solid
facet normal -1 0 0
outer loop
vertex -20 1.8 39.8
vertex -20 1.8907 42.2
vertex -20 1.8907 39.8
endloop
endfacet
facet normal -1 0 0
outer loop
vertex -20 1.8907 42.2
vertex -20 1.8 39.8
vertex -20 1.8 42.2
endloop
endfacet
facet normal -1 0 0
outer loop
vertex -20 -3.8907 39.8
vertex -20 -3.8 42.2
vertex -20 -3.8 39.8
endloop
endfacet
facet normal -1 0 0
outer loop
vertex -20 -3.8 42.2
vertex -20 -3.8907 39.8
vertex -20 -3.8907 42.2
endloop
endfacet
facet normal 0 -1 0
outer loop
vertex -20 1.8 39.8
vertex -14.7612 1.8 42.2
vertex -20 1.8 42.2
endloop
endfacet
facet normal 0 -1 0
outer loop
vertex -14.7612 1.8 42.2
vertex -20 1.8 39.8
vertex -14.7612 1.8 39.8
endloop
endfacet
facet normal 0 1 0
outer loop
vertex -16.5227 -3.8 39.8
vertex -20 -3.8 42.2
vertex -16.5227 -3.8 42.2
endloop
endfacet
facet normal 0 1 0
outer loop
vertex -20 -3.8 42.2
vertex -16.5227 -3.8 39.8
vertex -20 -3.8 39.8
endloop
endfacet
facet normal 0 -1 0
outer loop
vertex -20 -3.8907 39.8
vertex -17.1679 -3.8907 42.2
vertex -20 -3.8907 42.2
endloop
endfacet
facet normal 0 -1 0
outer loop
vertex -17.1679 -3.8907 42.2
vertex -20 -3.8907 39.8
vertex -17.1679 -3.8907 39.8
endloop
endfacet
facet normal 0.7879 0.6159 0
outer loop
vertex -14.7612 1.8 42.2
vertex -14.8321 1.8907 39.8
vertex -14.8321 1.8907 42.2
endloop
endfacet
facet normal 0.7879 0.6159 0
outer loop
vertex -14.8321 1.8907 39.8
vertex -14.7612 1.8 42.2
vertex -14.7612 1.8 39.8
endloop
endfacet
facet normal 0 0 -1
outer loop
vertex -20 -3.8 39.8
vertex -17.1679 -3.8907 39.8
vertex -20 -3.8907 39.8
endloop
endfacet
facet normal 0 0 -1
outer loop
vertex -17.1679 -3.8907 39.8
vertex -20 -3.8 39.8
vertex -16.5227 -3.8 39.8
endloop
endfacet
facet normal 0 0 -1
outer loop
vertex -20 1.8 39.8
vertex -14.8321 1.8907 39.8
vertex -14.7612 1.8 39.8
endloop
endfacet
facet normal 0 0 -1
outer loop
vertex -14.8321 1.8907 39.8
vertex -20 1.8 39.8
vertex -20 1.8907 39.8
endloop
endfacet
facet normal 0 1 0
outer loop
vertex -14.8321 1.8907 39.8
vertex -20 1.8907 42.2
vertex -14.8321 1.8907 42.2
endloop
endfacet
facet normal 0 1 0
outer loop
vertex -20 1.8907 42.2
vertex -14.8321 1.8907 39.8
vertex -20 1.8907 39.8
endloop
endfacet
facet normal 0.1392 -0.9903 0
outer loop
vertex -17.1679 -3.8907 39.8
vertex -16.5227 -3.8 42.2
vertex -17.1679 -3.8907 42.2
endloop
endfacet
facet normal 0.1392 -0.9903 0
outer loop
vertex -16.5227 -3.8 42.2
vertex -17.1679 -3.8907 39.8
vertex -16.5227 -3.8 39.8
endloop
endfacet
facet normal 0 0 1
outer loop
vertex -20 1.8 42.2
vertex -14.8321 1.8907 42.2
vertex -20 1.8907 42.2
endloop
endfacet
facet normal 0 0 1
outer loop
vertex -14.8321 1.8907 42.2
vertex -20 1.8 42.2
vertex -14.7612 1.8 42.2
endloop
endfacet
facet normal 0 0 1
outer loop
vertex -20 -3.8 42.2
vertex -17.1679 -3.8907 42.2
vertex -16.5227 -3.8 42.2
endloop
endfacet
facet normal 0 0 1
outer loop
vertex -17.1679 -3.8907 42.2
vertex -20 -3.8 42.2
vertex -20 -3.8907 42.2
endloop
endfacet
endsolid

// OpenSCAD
// The Z adjust nut must not spin: a real M3 nut (5.4 AF, measured) turned
// 8 deg, swept along the slot toward its -X opening (starting 1 mm short of
// the screw so the end wall doesn't count), must hit the slot's side walls.
// Must render NON-empty.
include <../stage.scad>
af = 5.4;
intersection() {
  stage_z_slider();
  hull() for (dx = [-1, -zs_w])
    translate([xs_xc + zs_screw_x + dx, zs_screw_y, zs_z0 + zs_h - 5]) rotate([0, 0, 8])
      cylinder(d = af / cos(30), h = 2.4, center = true, $fn = 6);
}
